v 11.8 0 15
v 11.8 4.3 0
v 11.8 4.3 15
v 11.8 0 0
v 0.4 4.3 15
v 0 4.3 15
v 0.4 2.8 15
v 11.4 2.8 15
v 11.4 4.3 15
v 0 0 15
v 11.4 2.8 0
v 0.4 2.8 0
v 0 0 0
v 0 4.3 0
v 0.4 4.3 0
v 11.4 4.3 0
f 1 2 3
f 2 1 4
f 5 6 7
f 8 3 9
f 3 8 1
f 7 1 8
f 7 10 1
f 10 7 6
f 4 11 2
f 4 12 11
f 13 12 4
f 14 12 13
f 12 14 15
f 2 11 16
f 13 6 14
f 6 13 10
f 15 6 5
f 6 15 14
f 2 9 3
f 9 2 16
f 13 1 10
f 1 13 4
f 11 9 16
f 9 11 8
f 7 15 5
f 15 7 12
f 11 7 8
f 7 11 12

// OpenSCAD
// --- パラメータ（ここを調整してください） ---

// [1] 治具の差し込み部分の長さ (mm)
plug_depth = 15;

// [2] 嵌め合いのきつさ調整（クリアランス）
// 0 = ポート内寸とほぼ同じサイズ
// プラスの値 = 小さくなる（緩くなる）
// マイナスの値 = 大きくなる（きつくなる）
// まずは 0.2 くらいからお試しください。
clearance = 0.2;


// --- ここから下は基本的には変更不要です ---

// USB-Aポートの公称内寸 (mm)
port_width = 12.0;
port_height = 4.5;

// シェルや内部ブロックの概算寸法
shell_thickness = 0.4;
internal_block_height = 2.4;


/**
 * USB-A オス形状の治具を生成するモジュール
 */
module usb_a_male_jig() {
    
    // クリアランスを考慮した治具の寸法
    jig_width = port_width - clearance;
    jig_height = port_height - clearance;

    // 治具本体を生成
    union() {
        // 1. 外殻（U字型のシェル部分）
        difference() {
            // 全体の直方体
            cube([jig_width, jig_height, plug_depth]);
            
            // 内部をくり抜く（下側は開いている形状）
            translate([shell_thickness, shell_thickness, -1]) {
                cube([
                    jig_width - shell_thickness * 2,
                    jig_height, // 高さいっぱいにくり抜く
                    plug_depth + 2
                ]);
            }
        }
        
        // 2. 内部の接点がある部分（単純なブロックで表現）
        translate([shell_thickness, shell_thickness, 0]) {
             cube([
                 jig_width - shell_thickness * 2,
                 internal_block_height,
                 plug_depth
             ]);
        }
    }
}


/**
 * 治具全体のデザイン例
 * 持ちやすいように円柱の土台を追加
 */
// USBプラグ部分の呼び出し
usb_a_male_jig();
